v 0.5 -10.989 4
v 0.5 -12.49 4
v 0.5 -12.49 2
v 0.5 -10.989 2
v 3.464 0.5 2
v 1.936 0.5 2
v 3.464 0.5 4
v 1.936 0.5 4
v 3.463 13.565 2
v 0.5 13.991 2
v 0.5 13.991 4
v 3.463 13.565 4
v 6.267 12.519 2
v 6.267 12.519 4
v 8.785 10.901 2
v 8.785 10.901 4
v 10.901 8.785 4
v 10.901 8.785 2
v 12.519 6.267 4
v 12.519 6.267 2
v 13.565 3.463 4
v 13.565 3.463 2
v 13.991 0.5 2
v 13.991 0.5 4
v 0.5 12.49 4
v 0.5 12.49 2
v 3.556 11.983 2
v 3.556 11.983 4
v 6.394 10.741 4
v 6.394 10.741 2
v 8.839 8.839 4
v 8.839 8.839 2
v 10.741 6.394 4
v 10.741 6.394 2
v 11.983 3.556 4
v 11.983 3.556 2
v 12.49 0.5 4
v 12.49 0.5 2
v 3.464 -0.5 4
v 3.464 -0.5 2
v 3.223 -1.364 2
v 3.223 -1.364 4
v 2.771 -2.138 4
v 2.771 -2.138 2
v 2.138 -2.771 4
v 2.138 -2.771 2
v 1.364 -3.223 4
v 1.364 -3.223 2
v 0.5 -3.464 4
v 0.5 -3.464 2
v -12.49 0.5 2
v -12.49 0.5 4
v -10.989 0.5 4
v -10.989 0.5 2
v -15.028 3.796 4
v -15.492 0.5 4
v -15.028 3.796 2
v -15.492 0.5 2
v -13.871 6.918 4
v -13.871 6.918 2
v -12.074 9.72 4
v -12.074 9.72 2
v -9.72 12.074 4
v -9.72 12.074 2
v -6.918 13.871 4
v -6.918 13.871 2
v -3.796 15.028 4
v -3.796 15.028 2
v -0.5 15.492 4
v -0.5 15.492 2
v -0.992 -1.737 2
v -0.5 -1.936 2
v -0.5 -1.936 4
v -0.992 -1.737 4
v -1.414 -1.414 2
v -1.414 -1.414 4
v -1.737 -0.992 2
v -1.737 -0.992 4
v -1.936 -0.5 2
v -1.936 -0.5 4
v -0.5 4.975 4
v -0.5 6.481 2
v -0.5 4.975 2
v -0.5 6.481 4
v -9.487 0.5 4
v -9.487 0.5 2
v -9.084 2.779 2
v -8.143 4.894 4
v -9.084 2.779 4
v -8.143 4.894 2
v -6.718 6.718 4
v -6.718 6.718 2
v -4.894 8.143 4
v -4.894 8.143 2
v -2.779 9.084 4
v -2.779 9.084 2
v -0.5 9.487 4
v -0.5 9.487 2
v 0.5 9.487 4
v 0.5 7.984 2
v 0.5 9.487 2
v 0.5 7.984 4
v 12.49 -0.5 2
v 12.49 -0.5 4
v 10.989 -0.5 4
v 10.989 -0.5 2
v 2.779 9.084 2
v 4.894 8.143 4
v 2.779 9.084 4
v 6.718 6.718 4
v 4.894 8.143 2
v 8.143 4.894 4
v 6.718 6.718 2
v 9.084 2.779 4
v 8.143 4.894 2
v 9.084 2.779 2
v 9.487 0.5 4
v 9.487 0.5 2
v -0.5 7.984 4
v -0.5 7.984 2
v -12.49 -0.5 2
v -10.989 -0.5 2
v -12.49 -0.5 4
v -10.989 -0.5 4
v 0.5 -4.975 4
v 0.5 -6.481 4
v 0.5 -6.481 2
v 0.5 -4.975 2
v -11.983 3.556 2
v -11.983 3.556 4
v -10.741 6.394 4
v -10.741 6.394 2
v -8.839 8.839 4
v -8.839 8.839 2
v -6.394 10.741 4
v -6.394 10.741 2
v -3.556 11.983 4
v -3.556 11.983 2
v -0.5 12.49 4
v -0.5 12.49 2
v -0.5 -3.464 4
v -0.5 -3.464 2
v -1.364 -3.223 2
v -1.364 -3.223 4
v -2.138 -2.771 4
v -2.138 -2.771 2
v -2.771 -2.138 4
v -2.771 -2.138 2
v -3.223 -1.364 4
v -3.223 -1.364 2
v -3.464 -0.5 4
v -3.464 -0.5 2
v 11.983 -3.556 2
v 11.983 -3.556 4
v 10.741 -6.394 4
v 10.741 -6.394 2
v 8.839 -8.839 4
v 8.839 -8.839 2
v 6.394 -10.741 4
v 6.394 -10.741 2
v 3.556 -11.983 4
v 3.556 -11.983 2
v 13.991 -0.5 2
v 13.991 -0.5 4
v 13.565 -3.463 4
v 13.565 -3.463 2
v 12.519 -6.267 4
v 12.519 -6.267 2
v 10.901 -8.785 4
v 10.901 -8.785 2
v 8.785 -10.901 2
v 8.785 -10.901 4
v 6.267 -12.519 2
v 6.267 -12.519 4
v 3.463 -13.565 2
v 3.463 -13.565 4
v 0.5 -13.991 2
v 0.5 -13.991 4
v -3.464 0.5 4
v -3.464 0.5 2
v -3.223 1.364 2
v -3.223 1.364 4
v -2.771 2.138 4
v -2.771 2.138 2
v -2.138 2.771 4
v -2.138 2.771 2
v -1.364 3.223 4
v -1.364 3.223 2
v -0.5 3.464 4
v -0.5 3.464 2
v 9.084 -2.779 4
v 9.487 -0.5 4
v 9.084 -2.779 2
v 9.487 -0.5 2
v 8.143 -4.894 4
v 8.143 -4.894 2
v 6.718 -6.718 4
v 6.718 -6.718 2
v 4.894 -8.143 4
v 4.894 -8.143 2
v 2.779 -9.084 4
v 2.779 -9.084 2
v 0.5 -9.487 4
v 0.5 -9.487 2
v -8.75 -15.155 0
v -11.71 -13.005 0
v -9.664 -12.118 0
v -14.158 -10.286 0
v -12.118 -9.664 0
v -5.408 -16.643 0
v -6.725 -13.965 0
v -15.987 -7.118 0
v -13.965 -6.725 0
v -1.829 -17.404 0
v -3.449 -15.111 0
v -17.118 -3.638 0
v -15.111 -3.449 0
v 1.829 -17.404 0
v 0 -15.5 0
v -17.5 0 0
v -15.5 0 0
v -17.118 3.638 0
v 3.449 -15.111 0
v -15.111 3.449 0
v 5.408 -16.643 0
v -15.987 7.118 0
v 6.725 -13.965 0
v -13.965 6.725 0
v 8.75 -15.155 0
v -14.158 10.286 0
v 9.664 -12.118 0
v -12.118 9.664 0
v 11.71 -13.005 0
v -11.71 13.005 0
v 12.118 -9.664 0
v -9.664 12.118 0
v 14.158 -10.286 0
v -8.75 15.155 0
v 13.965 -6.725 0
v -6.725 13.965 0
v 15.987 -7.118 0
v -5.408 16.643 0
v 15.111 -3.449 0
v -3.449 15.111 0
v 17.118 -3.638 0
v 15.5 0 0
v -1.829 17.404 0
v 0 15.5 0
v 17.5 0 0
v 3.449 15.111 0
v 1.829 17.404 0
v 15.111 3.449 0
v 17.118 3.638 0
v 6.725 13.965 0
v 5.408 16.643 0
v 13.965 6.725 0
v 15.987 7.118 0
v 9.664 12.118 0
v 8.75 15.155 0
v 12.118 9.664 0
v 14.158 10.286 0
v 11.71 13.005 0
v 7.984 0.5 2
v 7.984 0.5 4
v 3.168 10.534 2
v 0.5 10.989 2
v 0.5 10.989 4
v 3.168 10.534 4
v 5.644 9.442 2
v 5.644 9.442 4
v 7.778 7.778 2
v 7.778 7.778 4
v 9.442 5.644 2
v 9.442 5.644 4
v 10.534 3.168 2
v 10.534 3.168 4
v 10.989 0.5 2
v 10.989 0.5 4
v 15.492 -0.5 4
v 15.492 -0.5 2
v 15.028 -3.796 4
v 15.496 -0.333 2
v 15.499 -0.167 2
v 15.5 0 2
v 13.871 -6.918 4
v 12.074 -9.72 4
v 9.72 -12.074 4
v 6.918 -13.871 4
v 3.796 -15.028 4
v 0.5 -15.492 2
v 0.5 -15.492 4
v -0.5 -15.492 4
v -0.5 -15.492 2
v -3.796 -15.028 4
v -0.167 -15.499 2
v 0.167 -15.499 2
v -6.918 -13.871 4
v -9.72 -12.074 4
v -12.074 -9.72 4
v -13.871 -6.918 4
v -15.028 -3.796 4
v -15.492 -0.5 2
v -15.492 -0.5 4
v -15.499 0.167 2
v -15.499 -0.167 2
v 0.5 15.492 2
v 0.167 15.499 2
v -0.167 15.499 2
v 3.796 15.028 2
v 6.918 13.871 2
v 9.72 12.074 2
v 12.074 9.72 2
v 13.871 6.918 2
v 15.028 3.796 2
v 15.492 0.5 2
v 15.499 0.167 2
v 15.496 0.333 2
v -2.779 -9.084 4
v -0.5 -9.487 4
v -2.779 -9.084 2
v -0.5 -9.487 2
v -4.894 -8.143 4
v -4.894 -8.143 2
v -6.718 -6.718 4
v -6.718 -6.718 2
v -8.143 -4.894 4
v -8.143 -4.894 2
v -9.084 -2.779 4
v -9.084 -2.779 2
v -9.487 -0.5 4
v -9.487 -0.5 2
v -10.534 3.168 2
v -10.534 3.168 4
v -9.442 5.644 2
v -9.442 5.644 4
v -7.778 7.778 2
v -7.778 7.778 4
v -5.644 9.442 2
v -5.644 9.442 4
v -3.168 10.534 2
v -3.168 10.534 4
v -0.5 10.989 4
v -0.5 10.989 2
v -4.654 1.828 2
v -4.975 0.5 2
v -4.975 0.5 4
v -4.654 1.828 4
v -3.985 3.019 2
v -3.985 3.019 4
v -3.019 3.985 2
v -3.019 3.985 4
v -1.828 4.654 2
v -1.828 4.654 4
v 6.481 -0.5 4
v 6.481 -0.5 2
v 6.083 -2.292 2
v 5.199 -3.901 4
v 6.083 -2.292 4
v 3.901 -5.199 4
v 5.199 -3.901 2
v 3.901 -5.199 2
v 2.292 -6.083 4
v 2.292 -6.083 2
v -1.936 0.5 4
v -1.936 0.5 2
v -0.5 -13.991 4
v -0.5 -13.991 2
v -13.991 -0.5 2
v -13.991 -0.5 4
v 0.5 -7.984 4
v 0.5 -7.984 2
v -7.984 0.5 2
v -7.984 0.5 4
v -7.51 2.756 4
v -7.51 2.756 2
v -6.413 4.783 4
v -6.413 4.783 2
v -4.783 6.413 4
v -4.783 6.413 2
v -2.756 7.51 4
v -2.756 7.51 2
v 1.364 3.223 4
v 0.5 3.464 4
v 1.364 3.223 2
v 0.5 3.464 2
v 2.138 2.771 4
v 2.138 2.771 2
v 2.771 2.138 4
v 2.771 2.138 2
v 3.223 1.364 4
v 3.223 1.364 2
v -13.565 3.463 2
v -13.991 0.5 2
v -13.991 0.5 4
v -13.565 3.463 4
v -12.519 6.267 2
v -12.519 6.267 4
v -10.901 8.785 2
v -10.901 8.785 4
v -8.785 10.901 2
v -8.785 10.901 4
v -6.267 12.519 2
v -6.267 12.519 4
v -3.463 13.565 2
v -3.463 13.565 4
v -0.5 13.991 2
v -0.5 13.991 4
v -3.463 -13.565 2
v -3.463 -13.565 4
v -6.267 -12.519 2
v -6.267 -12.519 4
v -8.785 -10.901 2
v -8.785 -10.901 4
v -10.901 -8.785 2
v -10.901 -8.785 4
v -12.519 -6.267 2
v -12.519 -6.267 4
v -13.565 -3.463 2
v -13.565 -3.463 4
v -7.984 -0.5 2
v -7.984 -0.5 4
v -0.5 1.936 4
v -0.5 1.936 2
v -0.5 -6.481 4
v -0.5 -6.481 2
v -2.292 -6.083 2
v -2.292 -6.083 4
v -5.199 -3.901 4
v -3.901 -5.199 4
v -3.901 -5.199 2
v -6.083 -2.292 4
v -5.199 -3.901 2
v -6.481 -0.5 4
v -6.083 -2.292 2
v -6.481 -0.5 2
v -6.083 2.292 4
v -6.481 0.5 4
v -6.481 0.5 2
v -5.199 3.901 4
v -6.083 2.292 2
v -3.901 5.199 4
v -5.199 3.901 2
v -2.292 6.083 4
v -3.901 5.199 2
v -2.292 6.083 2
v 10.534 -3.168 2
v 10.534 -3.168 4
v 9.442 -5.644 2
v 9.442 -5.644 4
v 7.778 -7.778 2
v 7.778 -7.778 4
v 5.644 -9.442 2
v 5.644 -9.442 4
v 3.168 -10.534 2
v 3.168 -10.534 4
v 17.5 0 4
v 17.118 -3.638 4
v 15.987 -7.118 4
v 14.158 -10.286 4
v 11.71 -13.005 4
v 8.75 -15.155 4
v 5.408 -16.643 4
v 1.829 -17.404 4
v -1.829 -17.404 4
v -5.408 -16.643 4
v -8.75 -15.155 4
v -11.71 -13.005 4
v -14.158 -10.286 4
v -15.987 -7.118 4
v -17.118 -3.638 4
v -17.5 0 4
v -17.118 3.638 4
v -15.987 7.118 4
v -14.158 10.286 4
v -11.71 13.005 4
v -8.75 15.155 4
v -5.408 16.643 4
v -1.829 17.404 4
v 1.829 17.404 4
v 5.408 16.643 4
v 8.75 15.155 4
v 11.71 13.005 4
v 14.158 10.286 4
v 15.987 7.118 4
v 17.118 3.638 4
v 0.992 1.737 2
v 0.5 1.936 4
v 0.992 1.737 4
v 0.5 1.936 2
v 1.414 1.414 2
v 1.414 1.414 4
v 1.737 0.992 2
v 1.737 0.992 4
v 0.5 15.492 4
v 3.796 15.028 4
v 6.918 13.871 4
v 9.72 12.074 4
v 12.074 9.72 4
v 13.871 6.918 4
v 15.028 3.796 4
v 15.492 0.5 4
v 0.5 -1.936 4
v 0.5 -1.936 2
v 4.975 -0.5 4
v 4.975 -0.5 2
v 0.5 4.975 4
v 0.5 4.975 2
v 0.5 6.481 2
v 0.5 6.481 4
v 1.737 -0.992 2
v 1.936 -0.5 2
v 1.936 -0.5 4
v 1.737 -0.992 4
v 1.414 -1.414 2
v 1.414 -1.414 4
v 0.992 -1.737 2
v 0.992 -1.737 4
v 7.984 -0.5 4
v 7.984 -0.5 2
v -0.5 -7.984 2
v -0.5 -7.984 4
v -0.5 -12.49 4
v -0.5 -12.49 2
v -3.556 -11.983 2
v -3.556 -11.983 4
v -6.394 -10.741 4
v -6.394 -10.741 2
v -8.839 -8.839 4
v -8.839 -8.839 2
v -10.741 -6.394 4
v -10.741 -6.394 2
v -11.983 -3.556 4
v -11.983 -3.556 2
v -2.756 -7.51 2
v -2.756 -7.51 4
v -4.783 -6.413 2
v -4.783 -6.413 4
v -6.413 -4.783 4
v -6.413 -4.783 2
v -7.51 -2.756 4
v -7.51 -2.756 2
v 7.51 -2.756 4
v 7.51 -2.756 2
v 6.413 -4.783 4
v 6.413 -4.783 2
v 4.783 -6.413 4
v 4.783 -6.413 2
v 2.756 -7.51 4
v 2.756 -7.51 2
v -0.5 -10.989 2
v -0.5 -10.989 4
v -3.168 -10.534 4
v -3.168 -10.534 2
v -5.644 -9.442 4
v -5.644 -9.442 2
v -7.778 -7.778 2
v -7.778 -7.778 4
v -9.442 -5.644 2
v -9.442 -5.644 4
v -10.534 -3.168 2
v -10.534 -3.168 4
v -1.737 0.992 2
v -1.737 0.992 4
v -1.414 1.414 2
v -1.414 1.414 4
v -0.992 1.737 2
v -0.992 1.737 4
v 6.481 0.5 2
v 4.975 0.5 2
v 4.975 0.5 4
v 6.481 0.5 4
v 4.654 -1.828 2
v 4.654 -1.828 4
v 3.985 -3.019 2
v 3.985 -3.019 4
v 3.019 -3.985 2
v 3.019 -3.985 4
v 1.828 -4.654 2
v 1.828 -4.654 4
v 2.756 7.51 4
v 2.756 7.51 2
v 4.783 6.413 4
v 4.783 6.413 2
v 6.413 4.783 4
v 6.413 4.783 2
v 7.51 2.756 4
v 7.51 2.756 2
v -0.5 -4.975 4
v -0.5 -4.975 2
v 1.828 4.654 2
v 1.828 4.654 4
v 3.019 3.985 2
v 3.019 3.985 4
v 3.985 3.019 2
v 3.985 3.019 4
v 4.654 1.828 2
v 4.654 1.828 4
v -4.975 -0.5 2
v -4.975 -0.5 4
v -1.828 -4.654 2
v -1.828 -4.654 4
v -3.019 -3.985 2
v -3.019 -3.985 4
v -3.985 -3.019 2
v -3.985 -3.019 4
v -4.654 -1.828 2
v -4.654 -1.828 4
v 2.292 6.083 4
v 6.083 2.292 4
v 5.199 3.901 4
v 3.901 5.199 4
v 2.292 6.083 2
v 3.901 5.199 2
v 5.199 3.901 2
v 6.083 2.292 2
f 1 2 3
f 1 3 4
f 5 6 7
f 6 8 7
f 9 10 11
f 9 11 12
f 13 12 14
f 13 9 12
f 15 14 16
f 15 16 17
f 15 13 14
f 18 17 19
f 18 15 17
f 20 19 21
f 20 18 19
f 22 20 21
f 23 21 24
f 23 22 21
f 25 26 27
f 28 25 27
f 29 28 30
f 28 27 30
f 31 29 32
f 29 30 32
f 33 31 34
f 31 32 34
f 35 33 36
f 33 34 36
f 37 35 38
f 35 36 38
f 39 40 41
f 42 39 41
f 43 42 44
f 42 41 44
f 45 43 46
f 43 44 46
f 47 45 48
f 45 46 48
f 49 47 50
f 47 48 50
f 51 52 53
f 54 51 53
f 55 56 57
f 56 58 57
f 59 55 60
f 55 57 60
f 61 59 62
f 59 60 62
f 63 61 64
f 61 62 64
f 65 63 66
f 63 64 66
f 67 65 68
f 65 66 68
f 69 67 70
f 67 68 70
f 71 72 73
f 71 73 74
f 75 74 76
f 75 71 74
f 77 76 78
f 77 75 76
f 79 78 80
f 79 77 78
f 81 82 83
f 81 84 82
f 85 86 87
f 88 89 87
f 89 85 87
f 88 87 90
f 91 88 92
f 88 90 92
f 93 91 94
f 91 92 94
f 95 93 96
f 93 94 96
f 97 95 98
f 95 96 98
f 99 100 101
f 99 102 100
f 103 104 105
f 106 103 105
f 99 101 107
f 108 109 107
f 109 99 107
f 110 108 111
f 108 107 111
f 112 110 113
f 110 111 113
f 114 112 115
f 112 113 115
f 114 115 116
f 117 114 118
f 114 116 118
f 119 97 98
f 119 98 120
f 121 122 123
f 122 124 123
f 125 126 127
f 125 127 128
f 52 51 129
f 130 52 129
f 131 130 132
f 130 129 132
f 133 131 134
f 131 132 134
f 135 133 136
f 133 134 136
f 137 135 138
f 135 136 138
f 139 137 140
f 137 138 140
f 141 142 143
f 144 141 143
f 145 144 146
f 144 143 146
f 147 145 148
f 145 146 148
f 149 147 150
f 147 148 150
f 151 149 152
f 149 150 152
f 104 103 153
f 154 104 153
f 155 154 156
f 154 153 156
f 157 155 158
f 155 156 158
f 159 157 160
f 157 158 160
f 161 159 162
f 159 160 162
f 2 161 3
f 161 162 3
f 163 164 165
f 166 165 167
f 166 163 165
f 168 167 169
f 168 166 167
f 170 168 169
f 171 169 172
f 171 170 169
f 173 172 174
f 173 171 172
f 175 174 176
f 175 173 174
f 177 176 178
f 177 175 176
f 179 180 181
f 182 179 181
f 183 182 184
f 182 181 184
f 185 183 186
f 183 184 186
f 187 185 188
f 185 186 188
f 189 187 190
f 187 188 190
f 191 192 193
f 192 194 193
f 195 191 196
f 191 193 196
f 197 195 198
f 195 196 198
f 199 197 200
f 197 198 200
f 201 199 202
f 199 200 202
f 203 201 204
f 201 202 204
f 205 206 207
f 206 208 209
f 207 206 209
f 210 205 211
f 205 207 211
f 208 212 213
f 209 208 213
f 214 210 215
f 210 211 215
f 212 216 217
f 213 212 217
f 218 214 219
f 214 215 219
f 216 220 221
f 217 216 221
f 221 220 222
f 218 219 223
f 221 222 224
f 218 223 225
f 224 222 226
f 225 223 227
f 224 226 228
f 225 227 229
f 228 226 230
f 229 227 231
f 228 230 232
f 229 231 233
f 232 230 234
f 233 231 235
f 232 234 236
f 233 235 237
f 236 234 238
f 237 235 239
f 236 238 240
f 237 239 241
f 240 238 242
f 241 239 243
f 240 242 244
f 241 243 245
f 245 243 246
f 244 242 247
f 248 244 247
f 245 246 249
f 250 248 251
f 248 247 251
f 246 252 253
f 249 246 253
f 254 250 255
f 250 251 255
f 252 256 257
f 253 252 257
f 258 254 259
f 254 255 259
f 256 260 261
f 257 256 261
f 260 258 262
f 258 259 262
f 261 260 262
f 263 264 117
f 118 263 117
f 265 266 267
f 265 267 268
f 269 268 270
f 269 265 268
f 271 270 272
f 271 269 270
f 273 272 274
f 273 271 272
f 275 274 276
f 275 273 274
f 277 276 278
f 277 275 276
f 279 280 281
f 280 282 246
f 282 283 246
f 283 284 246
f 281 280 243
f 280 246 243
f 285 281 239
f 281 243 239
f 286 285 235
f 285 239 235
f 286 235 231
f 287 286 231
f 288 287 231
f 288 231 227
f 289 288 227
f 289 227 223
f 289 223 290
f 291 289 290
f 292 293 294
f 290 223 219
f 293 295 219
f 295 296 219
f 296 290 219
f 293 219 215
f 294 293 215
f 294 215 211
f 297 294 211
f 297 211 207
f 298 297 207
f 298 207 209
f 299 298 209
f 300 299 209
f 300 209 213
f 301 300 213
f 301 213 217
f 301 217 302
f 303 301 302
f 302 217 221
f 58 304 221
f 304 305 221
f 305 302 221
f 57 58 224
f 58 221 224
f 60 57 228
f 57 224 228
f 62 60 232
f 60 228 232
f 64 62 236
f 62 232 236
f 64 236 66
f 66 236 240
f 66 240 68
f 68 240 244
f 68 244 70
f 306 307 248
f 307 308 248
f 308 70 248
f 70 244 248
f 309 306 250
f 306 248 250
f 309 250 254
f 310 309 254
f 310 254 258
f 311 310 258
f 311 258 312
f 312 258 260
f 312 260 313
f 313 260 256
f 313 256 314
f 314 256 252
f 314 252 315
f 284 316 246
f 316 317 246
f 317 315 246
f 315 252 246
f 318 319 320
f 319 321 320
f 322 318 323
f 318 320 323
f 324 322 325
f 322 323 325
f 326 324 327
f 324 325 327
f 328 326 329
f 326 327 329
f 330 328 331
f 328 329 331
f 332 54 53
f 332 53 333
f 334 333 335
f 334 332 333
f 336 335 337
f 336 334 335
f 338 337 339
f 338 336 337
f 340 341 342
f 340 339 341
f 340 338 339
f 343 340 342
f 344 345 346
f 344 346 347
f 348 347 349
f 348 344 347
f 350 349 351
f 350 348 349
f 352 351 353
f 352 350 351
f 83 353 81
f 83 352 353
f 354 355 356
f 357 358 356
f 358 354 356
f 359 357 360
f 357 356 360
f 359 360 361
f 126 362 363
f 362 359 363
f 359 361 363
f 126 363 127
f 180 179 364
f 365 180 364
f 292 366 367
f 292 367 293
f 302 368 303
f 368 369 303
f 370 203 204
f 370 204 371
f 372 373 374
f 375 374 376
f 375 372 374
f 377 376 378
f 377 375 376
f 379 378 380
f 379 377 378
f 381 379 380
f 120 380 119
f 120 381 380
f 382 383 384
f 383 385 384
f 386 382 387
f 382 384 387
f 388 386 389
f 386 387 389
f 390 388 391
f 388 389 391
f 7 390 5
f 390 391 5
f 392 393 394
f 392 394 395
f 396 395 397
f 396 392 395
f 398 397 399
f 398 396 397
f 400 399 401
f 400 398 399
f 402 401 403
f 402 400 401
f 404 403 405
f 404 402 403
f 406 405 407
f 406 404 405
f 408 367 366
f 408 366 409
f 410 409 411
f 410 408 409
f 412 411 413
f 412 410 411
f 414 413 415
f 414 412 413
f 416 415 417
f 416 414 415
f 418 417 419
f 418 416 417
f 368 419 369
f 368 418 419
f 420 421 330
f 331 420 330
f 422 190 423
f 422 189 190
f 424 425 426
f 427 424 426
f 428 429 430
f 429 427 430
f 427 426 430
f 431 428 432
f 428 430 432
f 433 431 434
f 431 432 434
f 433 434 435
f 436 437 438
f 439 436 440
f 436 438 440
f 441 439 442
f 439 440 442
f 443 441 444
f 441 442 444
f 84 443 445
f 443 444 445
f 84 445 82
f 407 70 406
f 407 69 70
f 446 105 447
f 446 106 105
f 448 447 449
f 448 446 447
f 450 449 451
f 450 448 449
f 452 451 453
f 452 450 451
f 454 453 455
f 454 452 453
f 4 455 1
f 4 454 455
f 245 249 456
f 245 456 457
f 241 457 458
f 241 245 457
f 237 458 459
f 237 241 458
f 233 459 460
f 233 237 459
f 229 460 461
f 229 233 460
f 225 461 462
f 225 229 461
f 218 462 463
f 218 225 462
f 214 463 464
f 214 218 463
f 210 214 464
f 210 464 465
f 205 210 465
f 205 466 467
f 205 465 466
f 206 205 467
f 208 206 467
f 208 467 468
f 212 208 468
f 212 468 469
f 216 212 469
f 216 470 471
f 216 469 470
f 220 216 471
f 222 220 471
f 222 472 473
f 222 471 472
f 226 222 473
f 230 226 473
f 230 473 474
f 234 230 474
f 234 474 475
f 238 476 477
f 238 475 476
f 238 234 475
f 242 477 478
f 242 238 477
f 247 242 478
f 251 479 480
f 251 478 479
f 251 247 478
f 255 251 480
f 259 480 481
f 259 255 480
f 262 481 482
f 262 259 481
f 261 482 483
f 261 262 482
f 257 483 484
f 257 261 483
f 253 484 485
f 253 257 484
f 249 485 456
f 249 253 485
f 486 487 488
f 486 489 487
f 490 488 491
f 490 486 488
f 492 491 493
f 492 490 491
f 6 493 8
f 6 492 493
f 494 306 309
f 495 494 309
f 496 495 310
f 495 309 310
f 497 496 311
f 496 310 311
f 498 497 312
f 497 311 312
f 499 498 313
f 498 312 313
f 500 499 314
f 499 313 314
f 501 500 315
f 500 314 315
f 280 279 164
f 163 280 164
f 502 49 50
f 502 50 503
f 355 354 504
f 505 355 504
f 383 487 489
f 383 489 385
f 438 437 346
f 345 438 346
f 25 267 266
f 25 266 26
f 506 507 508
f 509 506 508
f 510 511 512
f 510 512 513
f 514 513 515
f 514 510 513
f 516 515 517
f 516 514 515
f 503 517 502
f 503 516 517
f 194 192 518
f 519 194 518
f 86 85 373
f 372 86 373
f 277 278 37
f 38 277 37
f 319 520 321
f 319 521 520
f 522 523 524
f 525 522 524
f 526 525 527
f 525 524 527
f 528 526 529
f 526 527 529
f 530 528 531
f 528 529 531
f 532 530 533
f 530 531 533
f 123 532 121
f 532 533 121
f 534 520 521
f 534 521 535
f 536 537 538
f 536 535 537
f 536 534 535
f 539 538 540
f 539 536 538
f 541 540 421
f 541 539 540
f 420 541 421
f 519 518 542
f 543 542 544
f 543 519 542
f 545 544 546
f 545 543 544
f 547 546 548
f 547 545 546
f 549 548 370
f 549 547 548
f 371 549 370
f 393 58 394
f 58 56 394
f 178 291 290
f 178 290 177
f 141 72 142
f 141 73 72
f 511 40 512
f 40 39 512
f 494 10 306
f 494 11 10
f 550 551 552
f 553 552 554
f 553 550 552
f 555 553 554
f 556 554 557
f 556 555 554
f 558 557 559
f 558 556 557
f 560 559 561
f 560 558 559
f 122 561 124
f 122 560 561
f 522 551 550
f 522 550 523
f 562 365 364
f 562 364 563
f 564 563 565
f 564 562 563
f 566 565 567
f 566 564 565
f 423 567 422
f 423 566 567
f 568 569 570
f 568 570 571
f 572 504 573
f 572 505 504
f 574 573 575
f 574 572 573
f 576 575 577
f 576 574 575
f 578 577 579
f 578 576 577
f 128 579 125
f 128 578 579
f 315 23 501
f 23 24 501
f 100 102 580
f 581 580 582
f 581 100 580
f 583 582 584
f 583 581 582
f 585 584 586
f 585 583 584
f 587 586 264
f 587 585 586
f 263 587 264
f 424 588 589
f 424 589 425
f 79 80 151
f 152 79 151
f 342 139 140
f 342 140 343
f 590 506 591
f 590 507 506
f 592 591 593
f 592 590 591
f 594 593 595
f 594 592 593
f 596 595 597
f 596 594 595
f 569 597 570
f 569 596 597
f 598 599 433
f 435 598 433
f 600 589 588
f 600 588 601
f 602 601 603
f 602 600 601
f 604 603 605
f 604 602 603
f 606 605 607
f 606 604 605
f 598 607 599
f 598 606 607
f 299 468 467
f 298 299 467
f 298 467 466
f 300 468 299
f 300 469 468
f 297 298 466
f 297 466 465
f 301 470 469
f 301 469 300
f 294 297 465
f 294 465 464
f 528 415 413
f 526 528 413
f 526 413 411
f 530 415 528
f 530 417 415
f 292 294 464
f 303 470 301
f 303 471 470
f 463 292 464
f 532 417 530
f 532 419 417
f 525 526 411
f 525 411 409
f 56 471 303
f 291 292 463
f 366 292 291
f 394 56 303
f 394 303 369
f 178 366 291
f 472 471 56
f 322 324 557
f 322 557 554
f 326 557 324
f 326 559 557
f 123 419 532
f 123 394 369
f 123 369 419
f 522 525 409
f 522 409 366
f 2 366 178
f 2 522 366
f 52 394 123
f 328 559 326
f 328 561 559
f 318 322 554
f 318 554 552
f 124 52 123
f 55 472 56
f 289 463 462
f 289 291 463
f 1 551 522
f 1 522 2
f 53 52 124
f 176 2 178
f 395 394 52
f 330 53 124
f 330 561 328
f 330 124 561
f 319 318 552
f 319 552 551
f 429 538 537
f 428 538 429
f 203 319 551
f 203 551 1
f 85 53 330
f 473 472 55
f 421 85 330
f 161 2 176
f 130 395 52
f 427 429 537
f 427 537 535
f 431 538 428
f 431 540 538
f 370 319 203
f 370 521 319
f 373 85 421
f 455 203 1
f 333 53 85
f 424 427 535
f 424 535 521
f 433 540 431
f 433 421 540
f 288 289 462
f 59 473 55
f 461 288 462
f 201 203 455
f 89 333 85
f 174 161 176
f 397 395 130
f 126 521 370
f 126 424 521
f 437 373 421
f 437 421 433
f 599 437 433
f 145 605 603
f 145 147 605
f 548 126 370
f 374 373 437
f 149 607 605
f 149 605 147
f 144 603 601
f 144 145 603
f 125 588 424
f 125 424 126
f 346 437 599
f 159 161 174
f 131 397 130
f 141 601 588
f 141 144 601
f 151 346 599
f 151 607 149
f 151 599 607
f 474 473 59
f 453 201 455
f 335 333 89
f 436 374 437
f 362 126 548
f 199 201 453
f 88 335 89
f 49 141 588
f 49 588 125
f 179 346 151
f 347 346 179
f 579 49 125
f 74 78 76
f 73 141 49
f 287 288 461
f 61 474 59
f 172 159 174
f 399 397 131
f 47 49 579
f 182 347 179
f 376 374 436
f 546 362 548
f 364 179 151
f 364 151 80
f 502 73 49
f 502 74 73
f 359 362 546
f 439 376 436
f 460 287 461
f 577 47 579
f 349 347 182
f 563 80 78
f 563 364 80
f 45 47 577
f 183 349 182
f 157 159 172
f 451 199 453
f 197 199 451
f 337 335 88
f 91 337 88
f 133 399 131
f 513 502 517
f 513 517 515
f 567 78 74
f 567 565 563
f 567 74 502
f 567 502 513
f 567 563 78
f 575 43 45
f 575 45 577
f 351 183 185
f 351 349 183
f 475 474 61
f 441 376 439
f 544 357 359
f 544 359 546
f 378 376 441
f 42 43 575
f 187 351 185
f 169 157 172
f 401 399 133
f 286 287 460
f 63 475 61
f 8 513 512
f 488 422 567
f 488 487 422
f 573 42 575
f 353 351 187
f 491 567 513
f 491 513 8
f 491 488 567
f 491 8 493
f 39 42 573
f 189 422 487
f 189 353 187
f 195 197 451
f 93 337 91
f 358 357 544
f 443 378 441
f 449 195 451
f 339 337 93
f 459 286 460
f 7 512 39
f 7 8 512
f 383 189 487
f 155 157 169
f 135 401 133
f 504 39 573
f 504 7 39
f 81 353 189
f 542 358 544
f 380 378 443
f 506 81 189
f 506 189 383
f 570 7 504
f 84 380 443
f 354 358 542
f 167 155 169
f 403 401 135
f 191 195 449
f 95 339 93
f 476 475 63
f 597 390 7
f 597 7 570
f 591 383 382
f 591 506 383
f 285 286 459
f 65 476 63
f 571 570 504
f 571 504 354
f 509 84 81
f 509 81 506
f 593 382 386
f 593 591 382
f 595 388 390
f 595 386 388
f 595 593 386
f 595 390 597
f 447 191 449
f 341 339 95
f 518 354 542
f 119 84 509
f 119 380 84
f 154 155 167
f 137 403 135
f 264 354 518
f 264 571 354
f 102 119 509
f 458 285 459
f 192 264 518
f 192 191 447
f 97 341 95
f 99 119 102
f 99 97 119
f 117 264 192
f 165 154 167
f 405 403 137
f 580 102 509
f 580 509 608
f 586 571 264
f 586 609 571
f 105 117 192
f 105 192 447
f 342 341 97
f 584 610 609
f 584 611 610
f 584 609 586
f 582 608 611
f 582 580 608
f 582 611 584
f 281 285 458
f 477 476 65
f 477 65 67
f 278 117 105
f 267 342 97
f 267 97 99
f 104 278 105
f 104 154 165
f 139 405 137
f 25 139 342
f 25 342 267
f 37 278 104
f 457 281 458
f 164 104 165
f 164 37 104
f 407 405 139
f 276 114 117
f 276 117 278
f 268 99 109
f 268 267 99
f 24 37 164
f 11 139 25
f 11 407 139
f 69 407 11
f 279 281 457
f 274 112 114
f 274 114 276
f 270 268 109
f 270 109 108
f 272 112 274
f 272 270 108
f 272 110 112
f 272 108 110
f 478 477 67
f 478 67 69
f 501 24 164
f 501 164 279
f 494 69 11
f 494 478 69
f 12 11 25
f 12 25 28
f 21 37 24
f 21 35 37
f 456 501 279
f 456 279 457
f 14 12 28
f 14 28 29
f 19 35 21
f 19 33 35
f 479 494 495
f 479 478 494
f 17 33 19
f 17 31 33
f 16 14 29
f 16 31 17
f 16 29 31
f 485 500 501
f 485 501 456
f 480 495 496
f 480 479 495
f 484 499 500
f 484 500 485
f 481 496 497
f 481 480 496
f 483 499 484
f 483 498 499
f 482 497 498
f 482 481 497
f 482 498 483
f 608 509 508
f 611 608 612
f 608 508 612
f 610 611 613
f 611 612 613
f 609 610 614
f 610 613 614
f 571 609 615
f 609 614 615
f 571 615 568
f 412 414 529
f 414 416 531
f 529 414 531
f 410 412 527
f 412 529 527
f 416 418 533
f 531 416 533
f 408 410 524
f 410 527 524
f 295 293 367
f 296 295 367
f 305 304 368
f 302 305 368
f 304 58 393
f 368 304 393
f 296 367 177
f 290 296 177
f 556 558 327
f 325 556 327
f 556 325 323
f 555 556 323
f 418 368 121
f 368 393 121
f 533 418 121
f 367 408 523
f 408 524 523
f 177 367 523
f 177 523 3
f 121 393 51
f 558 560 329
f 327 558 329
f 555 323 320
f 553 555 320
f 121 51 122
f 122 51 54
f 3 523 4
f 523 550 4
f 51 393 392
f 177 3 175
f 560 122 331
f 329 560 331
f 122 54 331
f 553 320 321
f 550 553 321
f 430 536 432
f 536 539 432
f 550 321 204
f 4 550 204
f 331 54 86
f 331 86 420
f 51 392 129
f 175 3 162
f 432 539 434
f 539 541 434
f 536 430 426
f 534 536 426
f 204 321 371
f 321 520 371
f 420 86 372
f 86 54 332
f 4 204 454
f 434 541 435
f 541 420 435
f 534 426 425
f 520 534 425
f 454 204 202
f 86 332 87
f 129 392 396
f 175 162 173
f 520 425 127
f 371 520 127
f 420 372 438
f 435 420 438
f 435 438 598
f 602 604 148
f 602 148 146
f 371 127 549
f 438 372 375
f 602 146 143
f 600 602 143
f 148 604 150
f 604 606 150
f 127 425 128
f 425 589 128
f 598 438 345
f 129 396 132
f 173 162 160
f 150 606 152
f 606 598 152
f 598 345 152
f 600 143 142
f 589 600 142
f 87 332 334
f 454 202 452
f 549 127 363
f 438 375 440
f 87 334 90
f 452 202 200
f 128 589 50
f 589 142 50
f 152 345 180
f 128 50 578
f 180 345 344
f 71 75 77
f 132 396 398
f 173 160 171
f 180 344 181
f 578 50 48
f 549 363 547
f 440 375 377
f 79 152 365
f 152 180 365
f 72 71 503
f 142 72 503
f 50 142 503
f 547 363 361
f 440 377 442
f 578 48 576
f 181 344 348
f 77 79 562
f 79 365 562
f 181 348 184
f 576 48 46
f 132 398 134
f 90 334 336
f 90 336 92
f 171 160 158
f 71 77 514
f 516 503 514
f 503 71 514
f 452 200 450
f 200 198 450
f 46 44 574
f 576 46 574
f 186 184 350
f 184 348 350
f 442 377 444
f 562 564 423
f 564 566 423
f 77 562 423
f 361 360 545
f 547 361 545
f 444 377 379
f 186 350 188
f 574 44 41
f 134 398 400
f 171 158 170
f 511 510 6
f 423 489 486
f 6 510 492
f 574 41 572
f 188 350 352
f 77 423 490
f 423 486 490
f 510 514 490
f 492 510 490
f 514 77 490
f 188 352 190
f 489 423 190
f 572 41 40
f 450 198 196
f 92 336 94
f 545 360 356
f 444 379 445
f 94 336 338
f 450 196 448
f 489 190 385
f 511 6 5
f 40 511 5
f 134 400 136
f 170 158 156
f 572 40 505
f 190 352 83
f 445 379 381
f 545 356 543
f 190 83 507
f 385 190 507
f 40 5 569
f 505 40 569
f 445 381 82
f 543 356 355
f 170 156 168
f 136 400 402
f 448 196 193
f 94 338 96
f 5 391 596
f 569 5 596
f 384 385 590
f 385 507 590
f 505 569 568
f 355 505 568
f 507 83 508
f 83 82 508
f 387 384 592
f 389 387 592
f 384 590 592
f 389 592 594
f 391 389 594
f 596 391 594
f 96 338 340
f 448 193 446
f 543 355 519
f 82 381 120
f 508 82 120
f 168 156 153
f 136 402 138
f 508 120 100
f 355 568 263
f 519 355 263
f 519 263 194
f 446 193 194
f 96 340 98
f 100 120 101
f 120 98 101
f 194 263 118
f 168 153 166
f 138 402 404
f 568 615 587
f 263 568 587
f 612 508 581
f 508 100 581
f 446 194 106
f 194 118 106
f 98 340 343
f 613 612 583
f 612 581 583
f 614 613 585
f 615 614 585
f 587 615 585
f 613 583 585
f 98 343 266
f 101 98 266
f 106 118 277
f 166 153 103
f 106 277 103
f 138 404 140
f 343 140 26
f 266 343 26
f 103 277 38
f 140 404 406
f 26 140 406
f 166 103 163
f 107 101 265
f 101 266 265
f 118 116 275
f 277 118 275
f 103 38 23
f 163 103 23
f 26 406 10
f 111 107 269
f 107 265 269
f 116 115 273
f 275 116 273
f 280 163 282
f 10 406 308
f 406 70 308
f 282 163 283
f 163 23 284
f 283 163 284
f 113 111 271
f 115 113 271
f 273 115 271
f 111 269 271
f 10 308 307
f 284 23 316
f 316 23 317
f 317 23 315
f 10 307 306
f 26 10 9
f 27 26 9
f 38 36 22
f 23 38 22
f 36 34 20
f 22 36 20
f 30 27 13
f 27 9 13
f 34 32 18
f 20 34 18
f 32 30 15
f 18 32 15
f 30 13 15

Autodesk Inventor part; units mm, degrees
ref_plane "YZ Plane" through (0, 0, 0) normal (1, 0, 0) x (0, 1, 0)
ref_plane "XZ Plane" through (0, 0, 0) normal (0, 1, 0) x (-1, 0, 0)
ref_plane "XY Plane" through (0, 0, 0) normal (0, 0, 1) x (1, 0, 0)
sketch "Boceto1" plane through (0, 0, 0) normal (0, 0, 1) x (1, 0, 0)
  circle A0 centre (0, 0) radius 17.5
  circle A1 centre (0, 0) radius 15.5
  dimension "d0" = 35
  dimension "d1" = 31
extrude "Extrusión1" add sketch "Boceto1" along normal blind 2
sketch "Boceto2" plane through (0, 0, 2) normal (0, 0, 1) x (1, 0, 0)
  circle A0 centre (0, 0) radius 17.5 projected
extrude "Extrusión2" add sketch "Boceto2" along normal blind 2
sketch "Boceto3" plane through (0, 0, 2) normal (0, 0, -1) x (-1, 0, 0)
  circle A0 centre (0, 0) radius 15.5 projected
  circle A1 centre (0, 0) radius 15.5 projected
  circle A2 centre (0, 0) radius 14
  circle A3 centre (0, 0) radius 12.5
  circle A4 centre (0, 0) radius 11
  circle A5 centre (0, 0) radius 9.5
  circle A6 centre (0, 0) radius 8
  circle A7 centre (0, 0) radius 6.5
  circle A8 centre (0, 0) radius 5
  circle A9 centre (0, 0) radius 3.5
  circle A10 centre (0, 0) radius 2
  line L0 (-0.5014, 1.9361) -> (-0.5014, 2)
  line L1 (-0.5014, 1.9361) -> (-0.5014, 15.5)
  line L2 (-0.5014, 1.9361) -> (13.0625, 1.9361) construction
  line L3 (0.5019, 1.9361) -> (0.5019, 15.5)
  line L4 (0.5019, 1.9361) -> (0.5019, -15.5)
  line L5 (-0.5014, 1.9361) -> (-0.5014, -15.5)
  line L6 (1.9361, 0.5016) -> (15.5, 0.5016)
  line L7 (1.9361, -0.5011) -> (15.5, -0.5011)
  line L8 (1.9361, -0.5011) -> (-15.5, -0.5011)
  line L9 (1.9361, 0.5016) -> (-15.5, 0.5016)
  dimension "d7" = 28
  dimension "d8" = 25
  dimension "d9" = 22
  dimension "d10" = 19
  dimension "d11" = 16
  dimension "d12" = 13
  dimension "d13" = 10
  dimension "d14" = 7
  dimension "d15" = 4
  dimension "d16" = 90
extrude "Extrusión3" cut sketch "Boceto3" against normal blind 2 contours A0 L7 A2 L6 | L6 A2 L3 A0 | A0 L4 A2 L7 | L3 A2 L1 A0 | A0 L5 A2 L4 | L1 A2 L9 A0 | L6 A4 L3 A3 | A3 L7 A4 L6 | A0 L8 A2 L5 | A3 L4 A4 L7 | L9 A2 L8 A0 | L3 A4 L1 A3 | A3 L5 A4 L4 | L1 A4 L9 A3 | L6 A6 L3 A5 | A5 L7 A6 L6 | A3 L8 A4 L5 | A5 L4 A6 L7 | L9 A4 L8 A3 | L3 A6 L1 A5 | A5 L5 A6 L4 | L1 A6 L9 A5 | L6 A8 L3 A7 | A7 L7 A8 L6 | A5 L8 A6 L5 | A7 L4 A8 L7 | L9 A6 L8 A5 | L3 A8 L1 A7 | A7 L5 A8 L4 | L1 A8 L9 A7 | L6 A10 L3 A9 | A9 L7 A10 L6 | A7 L8 A8 L5 | A9 L4 A10 L7 | L9 A8 L8 A7 | L3 A10 L0 L1 A9 | A9 L5 A10 L4 | L1 L0 A10 L9 A9 | A9 L8 A10 L5 | L9 A10 L8 A9
sketch "Boceto4" plane through (0, 0, 4) normal (0, 0, 1) x (1, 0, 0)
  line L0 (-16.1458, 0.5) -> (16.1458, 0.5)
  line L1 (16.1458, 0.5) -> (16.1458, -0.5)
  line L2 (16.1458, -0.5) -> (-16.1458, -0.5)
  line L3 (-16.1458, -0.5) -> (-16.1458, 0.5)
  line L4 (-16.1458, 0.5) -> (16.1458, -0.5) construction
  line L5 (16.1458, 0.5) -> (-16.1458, -0.5) construction
  line L6 (-0.5, -16.1458) -> (0.5, -16.1458)
  line L7 (0.5, -16.1458) -> (0.5, 16.1458)
  line L8 (0.5, 16.1458) -> (-0.5, 16.1458)
  line L9 (-0.5, 16.1458) -> (-0.5, -16.1458)
  line L10 (-0.5, -16.1458) -> (0.5, 16.1458) construction
  line L11 (0.5, -16.1458) -> (-0.5, 16.1458) construction
  point P0 (0, 0)
  point P1 (0, 0)
  dimension "d19" = 1
  dimension "d20" = 1
extrude "Extrusión4" add sketch "Boceto4" against normal blind 2
equation "\"Radio_pliegue\" = Grosor"
equation "\"Anchura_desahogo_plegado\" = Grosor"
equation "\"Profundidad_desahogo_plegado\" = 0.5 * Grosor"
equation "\"Tamaño_destalonado\" = 4 * Grosor"
equation "\"Remanente_mínimo\" = 2 * Grosor"
equation "\"Radiodetransición\" = Radio_pliegue"
equation "\"Tamaño_de_radio_de_Jacobi\" = Radio_pliegue"
equation "\"TamañoSeparación\" = Grosor"
equation "\"Grosor\" = 0.5"
properties part number "Lattice 2"
